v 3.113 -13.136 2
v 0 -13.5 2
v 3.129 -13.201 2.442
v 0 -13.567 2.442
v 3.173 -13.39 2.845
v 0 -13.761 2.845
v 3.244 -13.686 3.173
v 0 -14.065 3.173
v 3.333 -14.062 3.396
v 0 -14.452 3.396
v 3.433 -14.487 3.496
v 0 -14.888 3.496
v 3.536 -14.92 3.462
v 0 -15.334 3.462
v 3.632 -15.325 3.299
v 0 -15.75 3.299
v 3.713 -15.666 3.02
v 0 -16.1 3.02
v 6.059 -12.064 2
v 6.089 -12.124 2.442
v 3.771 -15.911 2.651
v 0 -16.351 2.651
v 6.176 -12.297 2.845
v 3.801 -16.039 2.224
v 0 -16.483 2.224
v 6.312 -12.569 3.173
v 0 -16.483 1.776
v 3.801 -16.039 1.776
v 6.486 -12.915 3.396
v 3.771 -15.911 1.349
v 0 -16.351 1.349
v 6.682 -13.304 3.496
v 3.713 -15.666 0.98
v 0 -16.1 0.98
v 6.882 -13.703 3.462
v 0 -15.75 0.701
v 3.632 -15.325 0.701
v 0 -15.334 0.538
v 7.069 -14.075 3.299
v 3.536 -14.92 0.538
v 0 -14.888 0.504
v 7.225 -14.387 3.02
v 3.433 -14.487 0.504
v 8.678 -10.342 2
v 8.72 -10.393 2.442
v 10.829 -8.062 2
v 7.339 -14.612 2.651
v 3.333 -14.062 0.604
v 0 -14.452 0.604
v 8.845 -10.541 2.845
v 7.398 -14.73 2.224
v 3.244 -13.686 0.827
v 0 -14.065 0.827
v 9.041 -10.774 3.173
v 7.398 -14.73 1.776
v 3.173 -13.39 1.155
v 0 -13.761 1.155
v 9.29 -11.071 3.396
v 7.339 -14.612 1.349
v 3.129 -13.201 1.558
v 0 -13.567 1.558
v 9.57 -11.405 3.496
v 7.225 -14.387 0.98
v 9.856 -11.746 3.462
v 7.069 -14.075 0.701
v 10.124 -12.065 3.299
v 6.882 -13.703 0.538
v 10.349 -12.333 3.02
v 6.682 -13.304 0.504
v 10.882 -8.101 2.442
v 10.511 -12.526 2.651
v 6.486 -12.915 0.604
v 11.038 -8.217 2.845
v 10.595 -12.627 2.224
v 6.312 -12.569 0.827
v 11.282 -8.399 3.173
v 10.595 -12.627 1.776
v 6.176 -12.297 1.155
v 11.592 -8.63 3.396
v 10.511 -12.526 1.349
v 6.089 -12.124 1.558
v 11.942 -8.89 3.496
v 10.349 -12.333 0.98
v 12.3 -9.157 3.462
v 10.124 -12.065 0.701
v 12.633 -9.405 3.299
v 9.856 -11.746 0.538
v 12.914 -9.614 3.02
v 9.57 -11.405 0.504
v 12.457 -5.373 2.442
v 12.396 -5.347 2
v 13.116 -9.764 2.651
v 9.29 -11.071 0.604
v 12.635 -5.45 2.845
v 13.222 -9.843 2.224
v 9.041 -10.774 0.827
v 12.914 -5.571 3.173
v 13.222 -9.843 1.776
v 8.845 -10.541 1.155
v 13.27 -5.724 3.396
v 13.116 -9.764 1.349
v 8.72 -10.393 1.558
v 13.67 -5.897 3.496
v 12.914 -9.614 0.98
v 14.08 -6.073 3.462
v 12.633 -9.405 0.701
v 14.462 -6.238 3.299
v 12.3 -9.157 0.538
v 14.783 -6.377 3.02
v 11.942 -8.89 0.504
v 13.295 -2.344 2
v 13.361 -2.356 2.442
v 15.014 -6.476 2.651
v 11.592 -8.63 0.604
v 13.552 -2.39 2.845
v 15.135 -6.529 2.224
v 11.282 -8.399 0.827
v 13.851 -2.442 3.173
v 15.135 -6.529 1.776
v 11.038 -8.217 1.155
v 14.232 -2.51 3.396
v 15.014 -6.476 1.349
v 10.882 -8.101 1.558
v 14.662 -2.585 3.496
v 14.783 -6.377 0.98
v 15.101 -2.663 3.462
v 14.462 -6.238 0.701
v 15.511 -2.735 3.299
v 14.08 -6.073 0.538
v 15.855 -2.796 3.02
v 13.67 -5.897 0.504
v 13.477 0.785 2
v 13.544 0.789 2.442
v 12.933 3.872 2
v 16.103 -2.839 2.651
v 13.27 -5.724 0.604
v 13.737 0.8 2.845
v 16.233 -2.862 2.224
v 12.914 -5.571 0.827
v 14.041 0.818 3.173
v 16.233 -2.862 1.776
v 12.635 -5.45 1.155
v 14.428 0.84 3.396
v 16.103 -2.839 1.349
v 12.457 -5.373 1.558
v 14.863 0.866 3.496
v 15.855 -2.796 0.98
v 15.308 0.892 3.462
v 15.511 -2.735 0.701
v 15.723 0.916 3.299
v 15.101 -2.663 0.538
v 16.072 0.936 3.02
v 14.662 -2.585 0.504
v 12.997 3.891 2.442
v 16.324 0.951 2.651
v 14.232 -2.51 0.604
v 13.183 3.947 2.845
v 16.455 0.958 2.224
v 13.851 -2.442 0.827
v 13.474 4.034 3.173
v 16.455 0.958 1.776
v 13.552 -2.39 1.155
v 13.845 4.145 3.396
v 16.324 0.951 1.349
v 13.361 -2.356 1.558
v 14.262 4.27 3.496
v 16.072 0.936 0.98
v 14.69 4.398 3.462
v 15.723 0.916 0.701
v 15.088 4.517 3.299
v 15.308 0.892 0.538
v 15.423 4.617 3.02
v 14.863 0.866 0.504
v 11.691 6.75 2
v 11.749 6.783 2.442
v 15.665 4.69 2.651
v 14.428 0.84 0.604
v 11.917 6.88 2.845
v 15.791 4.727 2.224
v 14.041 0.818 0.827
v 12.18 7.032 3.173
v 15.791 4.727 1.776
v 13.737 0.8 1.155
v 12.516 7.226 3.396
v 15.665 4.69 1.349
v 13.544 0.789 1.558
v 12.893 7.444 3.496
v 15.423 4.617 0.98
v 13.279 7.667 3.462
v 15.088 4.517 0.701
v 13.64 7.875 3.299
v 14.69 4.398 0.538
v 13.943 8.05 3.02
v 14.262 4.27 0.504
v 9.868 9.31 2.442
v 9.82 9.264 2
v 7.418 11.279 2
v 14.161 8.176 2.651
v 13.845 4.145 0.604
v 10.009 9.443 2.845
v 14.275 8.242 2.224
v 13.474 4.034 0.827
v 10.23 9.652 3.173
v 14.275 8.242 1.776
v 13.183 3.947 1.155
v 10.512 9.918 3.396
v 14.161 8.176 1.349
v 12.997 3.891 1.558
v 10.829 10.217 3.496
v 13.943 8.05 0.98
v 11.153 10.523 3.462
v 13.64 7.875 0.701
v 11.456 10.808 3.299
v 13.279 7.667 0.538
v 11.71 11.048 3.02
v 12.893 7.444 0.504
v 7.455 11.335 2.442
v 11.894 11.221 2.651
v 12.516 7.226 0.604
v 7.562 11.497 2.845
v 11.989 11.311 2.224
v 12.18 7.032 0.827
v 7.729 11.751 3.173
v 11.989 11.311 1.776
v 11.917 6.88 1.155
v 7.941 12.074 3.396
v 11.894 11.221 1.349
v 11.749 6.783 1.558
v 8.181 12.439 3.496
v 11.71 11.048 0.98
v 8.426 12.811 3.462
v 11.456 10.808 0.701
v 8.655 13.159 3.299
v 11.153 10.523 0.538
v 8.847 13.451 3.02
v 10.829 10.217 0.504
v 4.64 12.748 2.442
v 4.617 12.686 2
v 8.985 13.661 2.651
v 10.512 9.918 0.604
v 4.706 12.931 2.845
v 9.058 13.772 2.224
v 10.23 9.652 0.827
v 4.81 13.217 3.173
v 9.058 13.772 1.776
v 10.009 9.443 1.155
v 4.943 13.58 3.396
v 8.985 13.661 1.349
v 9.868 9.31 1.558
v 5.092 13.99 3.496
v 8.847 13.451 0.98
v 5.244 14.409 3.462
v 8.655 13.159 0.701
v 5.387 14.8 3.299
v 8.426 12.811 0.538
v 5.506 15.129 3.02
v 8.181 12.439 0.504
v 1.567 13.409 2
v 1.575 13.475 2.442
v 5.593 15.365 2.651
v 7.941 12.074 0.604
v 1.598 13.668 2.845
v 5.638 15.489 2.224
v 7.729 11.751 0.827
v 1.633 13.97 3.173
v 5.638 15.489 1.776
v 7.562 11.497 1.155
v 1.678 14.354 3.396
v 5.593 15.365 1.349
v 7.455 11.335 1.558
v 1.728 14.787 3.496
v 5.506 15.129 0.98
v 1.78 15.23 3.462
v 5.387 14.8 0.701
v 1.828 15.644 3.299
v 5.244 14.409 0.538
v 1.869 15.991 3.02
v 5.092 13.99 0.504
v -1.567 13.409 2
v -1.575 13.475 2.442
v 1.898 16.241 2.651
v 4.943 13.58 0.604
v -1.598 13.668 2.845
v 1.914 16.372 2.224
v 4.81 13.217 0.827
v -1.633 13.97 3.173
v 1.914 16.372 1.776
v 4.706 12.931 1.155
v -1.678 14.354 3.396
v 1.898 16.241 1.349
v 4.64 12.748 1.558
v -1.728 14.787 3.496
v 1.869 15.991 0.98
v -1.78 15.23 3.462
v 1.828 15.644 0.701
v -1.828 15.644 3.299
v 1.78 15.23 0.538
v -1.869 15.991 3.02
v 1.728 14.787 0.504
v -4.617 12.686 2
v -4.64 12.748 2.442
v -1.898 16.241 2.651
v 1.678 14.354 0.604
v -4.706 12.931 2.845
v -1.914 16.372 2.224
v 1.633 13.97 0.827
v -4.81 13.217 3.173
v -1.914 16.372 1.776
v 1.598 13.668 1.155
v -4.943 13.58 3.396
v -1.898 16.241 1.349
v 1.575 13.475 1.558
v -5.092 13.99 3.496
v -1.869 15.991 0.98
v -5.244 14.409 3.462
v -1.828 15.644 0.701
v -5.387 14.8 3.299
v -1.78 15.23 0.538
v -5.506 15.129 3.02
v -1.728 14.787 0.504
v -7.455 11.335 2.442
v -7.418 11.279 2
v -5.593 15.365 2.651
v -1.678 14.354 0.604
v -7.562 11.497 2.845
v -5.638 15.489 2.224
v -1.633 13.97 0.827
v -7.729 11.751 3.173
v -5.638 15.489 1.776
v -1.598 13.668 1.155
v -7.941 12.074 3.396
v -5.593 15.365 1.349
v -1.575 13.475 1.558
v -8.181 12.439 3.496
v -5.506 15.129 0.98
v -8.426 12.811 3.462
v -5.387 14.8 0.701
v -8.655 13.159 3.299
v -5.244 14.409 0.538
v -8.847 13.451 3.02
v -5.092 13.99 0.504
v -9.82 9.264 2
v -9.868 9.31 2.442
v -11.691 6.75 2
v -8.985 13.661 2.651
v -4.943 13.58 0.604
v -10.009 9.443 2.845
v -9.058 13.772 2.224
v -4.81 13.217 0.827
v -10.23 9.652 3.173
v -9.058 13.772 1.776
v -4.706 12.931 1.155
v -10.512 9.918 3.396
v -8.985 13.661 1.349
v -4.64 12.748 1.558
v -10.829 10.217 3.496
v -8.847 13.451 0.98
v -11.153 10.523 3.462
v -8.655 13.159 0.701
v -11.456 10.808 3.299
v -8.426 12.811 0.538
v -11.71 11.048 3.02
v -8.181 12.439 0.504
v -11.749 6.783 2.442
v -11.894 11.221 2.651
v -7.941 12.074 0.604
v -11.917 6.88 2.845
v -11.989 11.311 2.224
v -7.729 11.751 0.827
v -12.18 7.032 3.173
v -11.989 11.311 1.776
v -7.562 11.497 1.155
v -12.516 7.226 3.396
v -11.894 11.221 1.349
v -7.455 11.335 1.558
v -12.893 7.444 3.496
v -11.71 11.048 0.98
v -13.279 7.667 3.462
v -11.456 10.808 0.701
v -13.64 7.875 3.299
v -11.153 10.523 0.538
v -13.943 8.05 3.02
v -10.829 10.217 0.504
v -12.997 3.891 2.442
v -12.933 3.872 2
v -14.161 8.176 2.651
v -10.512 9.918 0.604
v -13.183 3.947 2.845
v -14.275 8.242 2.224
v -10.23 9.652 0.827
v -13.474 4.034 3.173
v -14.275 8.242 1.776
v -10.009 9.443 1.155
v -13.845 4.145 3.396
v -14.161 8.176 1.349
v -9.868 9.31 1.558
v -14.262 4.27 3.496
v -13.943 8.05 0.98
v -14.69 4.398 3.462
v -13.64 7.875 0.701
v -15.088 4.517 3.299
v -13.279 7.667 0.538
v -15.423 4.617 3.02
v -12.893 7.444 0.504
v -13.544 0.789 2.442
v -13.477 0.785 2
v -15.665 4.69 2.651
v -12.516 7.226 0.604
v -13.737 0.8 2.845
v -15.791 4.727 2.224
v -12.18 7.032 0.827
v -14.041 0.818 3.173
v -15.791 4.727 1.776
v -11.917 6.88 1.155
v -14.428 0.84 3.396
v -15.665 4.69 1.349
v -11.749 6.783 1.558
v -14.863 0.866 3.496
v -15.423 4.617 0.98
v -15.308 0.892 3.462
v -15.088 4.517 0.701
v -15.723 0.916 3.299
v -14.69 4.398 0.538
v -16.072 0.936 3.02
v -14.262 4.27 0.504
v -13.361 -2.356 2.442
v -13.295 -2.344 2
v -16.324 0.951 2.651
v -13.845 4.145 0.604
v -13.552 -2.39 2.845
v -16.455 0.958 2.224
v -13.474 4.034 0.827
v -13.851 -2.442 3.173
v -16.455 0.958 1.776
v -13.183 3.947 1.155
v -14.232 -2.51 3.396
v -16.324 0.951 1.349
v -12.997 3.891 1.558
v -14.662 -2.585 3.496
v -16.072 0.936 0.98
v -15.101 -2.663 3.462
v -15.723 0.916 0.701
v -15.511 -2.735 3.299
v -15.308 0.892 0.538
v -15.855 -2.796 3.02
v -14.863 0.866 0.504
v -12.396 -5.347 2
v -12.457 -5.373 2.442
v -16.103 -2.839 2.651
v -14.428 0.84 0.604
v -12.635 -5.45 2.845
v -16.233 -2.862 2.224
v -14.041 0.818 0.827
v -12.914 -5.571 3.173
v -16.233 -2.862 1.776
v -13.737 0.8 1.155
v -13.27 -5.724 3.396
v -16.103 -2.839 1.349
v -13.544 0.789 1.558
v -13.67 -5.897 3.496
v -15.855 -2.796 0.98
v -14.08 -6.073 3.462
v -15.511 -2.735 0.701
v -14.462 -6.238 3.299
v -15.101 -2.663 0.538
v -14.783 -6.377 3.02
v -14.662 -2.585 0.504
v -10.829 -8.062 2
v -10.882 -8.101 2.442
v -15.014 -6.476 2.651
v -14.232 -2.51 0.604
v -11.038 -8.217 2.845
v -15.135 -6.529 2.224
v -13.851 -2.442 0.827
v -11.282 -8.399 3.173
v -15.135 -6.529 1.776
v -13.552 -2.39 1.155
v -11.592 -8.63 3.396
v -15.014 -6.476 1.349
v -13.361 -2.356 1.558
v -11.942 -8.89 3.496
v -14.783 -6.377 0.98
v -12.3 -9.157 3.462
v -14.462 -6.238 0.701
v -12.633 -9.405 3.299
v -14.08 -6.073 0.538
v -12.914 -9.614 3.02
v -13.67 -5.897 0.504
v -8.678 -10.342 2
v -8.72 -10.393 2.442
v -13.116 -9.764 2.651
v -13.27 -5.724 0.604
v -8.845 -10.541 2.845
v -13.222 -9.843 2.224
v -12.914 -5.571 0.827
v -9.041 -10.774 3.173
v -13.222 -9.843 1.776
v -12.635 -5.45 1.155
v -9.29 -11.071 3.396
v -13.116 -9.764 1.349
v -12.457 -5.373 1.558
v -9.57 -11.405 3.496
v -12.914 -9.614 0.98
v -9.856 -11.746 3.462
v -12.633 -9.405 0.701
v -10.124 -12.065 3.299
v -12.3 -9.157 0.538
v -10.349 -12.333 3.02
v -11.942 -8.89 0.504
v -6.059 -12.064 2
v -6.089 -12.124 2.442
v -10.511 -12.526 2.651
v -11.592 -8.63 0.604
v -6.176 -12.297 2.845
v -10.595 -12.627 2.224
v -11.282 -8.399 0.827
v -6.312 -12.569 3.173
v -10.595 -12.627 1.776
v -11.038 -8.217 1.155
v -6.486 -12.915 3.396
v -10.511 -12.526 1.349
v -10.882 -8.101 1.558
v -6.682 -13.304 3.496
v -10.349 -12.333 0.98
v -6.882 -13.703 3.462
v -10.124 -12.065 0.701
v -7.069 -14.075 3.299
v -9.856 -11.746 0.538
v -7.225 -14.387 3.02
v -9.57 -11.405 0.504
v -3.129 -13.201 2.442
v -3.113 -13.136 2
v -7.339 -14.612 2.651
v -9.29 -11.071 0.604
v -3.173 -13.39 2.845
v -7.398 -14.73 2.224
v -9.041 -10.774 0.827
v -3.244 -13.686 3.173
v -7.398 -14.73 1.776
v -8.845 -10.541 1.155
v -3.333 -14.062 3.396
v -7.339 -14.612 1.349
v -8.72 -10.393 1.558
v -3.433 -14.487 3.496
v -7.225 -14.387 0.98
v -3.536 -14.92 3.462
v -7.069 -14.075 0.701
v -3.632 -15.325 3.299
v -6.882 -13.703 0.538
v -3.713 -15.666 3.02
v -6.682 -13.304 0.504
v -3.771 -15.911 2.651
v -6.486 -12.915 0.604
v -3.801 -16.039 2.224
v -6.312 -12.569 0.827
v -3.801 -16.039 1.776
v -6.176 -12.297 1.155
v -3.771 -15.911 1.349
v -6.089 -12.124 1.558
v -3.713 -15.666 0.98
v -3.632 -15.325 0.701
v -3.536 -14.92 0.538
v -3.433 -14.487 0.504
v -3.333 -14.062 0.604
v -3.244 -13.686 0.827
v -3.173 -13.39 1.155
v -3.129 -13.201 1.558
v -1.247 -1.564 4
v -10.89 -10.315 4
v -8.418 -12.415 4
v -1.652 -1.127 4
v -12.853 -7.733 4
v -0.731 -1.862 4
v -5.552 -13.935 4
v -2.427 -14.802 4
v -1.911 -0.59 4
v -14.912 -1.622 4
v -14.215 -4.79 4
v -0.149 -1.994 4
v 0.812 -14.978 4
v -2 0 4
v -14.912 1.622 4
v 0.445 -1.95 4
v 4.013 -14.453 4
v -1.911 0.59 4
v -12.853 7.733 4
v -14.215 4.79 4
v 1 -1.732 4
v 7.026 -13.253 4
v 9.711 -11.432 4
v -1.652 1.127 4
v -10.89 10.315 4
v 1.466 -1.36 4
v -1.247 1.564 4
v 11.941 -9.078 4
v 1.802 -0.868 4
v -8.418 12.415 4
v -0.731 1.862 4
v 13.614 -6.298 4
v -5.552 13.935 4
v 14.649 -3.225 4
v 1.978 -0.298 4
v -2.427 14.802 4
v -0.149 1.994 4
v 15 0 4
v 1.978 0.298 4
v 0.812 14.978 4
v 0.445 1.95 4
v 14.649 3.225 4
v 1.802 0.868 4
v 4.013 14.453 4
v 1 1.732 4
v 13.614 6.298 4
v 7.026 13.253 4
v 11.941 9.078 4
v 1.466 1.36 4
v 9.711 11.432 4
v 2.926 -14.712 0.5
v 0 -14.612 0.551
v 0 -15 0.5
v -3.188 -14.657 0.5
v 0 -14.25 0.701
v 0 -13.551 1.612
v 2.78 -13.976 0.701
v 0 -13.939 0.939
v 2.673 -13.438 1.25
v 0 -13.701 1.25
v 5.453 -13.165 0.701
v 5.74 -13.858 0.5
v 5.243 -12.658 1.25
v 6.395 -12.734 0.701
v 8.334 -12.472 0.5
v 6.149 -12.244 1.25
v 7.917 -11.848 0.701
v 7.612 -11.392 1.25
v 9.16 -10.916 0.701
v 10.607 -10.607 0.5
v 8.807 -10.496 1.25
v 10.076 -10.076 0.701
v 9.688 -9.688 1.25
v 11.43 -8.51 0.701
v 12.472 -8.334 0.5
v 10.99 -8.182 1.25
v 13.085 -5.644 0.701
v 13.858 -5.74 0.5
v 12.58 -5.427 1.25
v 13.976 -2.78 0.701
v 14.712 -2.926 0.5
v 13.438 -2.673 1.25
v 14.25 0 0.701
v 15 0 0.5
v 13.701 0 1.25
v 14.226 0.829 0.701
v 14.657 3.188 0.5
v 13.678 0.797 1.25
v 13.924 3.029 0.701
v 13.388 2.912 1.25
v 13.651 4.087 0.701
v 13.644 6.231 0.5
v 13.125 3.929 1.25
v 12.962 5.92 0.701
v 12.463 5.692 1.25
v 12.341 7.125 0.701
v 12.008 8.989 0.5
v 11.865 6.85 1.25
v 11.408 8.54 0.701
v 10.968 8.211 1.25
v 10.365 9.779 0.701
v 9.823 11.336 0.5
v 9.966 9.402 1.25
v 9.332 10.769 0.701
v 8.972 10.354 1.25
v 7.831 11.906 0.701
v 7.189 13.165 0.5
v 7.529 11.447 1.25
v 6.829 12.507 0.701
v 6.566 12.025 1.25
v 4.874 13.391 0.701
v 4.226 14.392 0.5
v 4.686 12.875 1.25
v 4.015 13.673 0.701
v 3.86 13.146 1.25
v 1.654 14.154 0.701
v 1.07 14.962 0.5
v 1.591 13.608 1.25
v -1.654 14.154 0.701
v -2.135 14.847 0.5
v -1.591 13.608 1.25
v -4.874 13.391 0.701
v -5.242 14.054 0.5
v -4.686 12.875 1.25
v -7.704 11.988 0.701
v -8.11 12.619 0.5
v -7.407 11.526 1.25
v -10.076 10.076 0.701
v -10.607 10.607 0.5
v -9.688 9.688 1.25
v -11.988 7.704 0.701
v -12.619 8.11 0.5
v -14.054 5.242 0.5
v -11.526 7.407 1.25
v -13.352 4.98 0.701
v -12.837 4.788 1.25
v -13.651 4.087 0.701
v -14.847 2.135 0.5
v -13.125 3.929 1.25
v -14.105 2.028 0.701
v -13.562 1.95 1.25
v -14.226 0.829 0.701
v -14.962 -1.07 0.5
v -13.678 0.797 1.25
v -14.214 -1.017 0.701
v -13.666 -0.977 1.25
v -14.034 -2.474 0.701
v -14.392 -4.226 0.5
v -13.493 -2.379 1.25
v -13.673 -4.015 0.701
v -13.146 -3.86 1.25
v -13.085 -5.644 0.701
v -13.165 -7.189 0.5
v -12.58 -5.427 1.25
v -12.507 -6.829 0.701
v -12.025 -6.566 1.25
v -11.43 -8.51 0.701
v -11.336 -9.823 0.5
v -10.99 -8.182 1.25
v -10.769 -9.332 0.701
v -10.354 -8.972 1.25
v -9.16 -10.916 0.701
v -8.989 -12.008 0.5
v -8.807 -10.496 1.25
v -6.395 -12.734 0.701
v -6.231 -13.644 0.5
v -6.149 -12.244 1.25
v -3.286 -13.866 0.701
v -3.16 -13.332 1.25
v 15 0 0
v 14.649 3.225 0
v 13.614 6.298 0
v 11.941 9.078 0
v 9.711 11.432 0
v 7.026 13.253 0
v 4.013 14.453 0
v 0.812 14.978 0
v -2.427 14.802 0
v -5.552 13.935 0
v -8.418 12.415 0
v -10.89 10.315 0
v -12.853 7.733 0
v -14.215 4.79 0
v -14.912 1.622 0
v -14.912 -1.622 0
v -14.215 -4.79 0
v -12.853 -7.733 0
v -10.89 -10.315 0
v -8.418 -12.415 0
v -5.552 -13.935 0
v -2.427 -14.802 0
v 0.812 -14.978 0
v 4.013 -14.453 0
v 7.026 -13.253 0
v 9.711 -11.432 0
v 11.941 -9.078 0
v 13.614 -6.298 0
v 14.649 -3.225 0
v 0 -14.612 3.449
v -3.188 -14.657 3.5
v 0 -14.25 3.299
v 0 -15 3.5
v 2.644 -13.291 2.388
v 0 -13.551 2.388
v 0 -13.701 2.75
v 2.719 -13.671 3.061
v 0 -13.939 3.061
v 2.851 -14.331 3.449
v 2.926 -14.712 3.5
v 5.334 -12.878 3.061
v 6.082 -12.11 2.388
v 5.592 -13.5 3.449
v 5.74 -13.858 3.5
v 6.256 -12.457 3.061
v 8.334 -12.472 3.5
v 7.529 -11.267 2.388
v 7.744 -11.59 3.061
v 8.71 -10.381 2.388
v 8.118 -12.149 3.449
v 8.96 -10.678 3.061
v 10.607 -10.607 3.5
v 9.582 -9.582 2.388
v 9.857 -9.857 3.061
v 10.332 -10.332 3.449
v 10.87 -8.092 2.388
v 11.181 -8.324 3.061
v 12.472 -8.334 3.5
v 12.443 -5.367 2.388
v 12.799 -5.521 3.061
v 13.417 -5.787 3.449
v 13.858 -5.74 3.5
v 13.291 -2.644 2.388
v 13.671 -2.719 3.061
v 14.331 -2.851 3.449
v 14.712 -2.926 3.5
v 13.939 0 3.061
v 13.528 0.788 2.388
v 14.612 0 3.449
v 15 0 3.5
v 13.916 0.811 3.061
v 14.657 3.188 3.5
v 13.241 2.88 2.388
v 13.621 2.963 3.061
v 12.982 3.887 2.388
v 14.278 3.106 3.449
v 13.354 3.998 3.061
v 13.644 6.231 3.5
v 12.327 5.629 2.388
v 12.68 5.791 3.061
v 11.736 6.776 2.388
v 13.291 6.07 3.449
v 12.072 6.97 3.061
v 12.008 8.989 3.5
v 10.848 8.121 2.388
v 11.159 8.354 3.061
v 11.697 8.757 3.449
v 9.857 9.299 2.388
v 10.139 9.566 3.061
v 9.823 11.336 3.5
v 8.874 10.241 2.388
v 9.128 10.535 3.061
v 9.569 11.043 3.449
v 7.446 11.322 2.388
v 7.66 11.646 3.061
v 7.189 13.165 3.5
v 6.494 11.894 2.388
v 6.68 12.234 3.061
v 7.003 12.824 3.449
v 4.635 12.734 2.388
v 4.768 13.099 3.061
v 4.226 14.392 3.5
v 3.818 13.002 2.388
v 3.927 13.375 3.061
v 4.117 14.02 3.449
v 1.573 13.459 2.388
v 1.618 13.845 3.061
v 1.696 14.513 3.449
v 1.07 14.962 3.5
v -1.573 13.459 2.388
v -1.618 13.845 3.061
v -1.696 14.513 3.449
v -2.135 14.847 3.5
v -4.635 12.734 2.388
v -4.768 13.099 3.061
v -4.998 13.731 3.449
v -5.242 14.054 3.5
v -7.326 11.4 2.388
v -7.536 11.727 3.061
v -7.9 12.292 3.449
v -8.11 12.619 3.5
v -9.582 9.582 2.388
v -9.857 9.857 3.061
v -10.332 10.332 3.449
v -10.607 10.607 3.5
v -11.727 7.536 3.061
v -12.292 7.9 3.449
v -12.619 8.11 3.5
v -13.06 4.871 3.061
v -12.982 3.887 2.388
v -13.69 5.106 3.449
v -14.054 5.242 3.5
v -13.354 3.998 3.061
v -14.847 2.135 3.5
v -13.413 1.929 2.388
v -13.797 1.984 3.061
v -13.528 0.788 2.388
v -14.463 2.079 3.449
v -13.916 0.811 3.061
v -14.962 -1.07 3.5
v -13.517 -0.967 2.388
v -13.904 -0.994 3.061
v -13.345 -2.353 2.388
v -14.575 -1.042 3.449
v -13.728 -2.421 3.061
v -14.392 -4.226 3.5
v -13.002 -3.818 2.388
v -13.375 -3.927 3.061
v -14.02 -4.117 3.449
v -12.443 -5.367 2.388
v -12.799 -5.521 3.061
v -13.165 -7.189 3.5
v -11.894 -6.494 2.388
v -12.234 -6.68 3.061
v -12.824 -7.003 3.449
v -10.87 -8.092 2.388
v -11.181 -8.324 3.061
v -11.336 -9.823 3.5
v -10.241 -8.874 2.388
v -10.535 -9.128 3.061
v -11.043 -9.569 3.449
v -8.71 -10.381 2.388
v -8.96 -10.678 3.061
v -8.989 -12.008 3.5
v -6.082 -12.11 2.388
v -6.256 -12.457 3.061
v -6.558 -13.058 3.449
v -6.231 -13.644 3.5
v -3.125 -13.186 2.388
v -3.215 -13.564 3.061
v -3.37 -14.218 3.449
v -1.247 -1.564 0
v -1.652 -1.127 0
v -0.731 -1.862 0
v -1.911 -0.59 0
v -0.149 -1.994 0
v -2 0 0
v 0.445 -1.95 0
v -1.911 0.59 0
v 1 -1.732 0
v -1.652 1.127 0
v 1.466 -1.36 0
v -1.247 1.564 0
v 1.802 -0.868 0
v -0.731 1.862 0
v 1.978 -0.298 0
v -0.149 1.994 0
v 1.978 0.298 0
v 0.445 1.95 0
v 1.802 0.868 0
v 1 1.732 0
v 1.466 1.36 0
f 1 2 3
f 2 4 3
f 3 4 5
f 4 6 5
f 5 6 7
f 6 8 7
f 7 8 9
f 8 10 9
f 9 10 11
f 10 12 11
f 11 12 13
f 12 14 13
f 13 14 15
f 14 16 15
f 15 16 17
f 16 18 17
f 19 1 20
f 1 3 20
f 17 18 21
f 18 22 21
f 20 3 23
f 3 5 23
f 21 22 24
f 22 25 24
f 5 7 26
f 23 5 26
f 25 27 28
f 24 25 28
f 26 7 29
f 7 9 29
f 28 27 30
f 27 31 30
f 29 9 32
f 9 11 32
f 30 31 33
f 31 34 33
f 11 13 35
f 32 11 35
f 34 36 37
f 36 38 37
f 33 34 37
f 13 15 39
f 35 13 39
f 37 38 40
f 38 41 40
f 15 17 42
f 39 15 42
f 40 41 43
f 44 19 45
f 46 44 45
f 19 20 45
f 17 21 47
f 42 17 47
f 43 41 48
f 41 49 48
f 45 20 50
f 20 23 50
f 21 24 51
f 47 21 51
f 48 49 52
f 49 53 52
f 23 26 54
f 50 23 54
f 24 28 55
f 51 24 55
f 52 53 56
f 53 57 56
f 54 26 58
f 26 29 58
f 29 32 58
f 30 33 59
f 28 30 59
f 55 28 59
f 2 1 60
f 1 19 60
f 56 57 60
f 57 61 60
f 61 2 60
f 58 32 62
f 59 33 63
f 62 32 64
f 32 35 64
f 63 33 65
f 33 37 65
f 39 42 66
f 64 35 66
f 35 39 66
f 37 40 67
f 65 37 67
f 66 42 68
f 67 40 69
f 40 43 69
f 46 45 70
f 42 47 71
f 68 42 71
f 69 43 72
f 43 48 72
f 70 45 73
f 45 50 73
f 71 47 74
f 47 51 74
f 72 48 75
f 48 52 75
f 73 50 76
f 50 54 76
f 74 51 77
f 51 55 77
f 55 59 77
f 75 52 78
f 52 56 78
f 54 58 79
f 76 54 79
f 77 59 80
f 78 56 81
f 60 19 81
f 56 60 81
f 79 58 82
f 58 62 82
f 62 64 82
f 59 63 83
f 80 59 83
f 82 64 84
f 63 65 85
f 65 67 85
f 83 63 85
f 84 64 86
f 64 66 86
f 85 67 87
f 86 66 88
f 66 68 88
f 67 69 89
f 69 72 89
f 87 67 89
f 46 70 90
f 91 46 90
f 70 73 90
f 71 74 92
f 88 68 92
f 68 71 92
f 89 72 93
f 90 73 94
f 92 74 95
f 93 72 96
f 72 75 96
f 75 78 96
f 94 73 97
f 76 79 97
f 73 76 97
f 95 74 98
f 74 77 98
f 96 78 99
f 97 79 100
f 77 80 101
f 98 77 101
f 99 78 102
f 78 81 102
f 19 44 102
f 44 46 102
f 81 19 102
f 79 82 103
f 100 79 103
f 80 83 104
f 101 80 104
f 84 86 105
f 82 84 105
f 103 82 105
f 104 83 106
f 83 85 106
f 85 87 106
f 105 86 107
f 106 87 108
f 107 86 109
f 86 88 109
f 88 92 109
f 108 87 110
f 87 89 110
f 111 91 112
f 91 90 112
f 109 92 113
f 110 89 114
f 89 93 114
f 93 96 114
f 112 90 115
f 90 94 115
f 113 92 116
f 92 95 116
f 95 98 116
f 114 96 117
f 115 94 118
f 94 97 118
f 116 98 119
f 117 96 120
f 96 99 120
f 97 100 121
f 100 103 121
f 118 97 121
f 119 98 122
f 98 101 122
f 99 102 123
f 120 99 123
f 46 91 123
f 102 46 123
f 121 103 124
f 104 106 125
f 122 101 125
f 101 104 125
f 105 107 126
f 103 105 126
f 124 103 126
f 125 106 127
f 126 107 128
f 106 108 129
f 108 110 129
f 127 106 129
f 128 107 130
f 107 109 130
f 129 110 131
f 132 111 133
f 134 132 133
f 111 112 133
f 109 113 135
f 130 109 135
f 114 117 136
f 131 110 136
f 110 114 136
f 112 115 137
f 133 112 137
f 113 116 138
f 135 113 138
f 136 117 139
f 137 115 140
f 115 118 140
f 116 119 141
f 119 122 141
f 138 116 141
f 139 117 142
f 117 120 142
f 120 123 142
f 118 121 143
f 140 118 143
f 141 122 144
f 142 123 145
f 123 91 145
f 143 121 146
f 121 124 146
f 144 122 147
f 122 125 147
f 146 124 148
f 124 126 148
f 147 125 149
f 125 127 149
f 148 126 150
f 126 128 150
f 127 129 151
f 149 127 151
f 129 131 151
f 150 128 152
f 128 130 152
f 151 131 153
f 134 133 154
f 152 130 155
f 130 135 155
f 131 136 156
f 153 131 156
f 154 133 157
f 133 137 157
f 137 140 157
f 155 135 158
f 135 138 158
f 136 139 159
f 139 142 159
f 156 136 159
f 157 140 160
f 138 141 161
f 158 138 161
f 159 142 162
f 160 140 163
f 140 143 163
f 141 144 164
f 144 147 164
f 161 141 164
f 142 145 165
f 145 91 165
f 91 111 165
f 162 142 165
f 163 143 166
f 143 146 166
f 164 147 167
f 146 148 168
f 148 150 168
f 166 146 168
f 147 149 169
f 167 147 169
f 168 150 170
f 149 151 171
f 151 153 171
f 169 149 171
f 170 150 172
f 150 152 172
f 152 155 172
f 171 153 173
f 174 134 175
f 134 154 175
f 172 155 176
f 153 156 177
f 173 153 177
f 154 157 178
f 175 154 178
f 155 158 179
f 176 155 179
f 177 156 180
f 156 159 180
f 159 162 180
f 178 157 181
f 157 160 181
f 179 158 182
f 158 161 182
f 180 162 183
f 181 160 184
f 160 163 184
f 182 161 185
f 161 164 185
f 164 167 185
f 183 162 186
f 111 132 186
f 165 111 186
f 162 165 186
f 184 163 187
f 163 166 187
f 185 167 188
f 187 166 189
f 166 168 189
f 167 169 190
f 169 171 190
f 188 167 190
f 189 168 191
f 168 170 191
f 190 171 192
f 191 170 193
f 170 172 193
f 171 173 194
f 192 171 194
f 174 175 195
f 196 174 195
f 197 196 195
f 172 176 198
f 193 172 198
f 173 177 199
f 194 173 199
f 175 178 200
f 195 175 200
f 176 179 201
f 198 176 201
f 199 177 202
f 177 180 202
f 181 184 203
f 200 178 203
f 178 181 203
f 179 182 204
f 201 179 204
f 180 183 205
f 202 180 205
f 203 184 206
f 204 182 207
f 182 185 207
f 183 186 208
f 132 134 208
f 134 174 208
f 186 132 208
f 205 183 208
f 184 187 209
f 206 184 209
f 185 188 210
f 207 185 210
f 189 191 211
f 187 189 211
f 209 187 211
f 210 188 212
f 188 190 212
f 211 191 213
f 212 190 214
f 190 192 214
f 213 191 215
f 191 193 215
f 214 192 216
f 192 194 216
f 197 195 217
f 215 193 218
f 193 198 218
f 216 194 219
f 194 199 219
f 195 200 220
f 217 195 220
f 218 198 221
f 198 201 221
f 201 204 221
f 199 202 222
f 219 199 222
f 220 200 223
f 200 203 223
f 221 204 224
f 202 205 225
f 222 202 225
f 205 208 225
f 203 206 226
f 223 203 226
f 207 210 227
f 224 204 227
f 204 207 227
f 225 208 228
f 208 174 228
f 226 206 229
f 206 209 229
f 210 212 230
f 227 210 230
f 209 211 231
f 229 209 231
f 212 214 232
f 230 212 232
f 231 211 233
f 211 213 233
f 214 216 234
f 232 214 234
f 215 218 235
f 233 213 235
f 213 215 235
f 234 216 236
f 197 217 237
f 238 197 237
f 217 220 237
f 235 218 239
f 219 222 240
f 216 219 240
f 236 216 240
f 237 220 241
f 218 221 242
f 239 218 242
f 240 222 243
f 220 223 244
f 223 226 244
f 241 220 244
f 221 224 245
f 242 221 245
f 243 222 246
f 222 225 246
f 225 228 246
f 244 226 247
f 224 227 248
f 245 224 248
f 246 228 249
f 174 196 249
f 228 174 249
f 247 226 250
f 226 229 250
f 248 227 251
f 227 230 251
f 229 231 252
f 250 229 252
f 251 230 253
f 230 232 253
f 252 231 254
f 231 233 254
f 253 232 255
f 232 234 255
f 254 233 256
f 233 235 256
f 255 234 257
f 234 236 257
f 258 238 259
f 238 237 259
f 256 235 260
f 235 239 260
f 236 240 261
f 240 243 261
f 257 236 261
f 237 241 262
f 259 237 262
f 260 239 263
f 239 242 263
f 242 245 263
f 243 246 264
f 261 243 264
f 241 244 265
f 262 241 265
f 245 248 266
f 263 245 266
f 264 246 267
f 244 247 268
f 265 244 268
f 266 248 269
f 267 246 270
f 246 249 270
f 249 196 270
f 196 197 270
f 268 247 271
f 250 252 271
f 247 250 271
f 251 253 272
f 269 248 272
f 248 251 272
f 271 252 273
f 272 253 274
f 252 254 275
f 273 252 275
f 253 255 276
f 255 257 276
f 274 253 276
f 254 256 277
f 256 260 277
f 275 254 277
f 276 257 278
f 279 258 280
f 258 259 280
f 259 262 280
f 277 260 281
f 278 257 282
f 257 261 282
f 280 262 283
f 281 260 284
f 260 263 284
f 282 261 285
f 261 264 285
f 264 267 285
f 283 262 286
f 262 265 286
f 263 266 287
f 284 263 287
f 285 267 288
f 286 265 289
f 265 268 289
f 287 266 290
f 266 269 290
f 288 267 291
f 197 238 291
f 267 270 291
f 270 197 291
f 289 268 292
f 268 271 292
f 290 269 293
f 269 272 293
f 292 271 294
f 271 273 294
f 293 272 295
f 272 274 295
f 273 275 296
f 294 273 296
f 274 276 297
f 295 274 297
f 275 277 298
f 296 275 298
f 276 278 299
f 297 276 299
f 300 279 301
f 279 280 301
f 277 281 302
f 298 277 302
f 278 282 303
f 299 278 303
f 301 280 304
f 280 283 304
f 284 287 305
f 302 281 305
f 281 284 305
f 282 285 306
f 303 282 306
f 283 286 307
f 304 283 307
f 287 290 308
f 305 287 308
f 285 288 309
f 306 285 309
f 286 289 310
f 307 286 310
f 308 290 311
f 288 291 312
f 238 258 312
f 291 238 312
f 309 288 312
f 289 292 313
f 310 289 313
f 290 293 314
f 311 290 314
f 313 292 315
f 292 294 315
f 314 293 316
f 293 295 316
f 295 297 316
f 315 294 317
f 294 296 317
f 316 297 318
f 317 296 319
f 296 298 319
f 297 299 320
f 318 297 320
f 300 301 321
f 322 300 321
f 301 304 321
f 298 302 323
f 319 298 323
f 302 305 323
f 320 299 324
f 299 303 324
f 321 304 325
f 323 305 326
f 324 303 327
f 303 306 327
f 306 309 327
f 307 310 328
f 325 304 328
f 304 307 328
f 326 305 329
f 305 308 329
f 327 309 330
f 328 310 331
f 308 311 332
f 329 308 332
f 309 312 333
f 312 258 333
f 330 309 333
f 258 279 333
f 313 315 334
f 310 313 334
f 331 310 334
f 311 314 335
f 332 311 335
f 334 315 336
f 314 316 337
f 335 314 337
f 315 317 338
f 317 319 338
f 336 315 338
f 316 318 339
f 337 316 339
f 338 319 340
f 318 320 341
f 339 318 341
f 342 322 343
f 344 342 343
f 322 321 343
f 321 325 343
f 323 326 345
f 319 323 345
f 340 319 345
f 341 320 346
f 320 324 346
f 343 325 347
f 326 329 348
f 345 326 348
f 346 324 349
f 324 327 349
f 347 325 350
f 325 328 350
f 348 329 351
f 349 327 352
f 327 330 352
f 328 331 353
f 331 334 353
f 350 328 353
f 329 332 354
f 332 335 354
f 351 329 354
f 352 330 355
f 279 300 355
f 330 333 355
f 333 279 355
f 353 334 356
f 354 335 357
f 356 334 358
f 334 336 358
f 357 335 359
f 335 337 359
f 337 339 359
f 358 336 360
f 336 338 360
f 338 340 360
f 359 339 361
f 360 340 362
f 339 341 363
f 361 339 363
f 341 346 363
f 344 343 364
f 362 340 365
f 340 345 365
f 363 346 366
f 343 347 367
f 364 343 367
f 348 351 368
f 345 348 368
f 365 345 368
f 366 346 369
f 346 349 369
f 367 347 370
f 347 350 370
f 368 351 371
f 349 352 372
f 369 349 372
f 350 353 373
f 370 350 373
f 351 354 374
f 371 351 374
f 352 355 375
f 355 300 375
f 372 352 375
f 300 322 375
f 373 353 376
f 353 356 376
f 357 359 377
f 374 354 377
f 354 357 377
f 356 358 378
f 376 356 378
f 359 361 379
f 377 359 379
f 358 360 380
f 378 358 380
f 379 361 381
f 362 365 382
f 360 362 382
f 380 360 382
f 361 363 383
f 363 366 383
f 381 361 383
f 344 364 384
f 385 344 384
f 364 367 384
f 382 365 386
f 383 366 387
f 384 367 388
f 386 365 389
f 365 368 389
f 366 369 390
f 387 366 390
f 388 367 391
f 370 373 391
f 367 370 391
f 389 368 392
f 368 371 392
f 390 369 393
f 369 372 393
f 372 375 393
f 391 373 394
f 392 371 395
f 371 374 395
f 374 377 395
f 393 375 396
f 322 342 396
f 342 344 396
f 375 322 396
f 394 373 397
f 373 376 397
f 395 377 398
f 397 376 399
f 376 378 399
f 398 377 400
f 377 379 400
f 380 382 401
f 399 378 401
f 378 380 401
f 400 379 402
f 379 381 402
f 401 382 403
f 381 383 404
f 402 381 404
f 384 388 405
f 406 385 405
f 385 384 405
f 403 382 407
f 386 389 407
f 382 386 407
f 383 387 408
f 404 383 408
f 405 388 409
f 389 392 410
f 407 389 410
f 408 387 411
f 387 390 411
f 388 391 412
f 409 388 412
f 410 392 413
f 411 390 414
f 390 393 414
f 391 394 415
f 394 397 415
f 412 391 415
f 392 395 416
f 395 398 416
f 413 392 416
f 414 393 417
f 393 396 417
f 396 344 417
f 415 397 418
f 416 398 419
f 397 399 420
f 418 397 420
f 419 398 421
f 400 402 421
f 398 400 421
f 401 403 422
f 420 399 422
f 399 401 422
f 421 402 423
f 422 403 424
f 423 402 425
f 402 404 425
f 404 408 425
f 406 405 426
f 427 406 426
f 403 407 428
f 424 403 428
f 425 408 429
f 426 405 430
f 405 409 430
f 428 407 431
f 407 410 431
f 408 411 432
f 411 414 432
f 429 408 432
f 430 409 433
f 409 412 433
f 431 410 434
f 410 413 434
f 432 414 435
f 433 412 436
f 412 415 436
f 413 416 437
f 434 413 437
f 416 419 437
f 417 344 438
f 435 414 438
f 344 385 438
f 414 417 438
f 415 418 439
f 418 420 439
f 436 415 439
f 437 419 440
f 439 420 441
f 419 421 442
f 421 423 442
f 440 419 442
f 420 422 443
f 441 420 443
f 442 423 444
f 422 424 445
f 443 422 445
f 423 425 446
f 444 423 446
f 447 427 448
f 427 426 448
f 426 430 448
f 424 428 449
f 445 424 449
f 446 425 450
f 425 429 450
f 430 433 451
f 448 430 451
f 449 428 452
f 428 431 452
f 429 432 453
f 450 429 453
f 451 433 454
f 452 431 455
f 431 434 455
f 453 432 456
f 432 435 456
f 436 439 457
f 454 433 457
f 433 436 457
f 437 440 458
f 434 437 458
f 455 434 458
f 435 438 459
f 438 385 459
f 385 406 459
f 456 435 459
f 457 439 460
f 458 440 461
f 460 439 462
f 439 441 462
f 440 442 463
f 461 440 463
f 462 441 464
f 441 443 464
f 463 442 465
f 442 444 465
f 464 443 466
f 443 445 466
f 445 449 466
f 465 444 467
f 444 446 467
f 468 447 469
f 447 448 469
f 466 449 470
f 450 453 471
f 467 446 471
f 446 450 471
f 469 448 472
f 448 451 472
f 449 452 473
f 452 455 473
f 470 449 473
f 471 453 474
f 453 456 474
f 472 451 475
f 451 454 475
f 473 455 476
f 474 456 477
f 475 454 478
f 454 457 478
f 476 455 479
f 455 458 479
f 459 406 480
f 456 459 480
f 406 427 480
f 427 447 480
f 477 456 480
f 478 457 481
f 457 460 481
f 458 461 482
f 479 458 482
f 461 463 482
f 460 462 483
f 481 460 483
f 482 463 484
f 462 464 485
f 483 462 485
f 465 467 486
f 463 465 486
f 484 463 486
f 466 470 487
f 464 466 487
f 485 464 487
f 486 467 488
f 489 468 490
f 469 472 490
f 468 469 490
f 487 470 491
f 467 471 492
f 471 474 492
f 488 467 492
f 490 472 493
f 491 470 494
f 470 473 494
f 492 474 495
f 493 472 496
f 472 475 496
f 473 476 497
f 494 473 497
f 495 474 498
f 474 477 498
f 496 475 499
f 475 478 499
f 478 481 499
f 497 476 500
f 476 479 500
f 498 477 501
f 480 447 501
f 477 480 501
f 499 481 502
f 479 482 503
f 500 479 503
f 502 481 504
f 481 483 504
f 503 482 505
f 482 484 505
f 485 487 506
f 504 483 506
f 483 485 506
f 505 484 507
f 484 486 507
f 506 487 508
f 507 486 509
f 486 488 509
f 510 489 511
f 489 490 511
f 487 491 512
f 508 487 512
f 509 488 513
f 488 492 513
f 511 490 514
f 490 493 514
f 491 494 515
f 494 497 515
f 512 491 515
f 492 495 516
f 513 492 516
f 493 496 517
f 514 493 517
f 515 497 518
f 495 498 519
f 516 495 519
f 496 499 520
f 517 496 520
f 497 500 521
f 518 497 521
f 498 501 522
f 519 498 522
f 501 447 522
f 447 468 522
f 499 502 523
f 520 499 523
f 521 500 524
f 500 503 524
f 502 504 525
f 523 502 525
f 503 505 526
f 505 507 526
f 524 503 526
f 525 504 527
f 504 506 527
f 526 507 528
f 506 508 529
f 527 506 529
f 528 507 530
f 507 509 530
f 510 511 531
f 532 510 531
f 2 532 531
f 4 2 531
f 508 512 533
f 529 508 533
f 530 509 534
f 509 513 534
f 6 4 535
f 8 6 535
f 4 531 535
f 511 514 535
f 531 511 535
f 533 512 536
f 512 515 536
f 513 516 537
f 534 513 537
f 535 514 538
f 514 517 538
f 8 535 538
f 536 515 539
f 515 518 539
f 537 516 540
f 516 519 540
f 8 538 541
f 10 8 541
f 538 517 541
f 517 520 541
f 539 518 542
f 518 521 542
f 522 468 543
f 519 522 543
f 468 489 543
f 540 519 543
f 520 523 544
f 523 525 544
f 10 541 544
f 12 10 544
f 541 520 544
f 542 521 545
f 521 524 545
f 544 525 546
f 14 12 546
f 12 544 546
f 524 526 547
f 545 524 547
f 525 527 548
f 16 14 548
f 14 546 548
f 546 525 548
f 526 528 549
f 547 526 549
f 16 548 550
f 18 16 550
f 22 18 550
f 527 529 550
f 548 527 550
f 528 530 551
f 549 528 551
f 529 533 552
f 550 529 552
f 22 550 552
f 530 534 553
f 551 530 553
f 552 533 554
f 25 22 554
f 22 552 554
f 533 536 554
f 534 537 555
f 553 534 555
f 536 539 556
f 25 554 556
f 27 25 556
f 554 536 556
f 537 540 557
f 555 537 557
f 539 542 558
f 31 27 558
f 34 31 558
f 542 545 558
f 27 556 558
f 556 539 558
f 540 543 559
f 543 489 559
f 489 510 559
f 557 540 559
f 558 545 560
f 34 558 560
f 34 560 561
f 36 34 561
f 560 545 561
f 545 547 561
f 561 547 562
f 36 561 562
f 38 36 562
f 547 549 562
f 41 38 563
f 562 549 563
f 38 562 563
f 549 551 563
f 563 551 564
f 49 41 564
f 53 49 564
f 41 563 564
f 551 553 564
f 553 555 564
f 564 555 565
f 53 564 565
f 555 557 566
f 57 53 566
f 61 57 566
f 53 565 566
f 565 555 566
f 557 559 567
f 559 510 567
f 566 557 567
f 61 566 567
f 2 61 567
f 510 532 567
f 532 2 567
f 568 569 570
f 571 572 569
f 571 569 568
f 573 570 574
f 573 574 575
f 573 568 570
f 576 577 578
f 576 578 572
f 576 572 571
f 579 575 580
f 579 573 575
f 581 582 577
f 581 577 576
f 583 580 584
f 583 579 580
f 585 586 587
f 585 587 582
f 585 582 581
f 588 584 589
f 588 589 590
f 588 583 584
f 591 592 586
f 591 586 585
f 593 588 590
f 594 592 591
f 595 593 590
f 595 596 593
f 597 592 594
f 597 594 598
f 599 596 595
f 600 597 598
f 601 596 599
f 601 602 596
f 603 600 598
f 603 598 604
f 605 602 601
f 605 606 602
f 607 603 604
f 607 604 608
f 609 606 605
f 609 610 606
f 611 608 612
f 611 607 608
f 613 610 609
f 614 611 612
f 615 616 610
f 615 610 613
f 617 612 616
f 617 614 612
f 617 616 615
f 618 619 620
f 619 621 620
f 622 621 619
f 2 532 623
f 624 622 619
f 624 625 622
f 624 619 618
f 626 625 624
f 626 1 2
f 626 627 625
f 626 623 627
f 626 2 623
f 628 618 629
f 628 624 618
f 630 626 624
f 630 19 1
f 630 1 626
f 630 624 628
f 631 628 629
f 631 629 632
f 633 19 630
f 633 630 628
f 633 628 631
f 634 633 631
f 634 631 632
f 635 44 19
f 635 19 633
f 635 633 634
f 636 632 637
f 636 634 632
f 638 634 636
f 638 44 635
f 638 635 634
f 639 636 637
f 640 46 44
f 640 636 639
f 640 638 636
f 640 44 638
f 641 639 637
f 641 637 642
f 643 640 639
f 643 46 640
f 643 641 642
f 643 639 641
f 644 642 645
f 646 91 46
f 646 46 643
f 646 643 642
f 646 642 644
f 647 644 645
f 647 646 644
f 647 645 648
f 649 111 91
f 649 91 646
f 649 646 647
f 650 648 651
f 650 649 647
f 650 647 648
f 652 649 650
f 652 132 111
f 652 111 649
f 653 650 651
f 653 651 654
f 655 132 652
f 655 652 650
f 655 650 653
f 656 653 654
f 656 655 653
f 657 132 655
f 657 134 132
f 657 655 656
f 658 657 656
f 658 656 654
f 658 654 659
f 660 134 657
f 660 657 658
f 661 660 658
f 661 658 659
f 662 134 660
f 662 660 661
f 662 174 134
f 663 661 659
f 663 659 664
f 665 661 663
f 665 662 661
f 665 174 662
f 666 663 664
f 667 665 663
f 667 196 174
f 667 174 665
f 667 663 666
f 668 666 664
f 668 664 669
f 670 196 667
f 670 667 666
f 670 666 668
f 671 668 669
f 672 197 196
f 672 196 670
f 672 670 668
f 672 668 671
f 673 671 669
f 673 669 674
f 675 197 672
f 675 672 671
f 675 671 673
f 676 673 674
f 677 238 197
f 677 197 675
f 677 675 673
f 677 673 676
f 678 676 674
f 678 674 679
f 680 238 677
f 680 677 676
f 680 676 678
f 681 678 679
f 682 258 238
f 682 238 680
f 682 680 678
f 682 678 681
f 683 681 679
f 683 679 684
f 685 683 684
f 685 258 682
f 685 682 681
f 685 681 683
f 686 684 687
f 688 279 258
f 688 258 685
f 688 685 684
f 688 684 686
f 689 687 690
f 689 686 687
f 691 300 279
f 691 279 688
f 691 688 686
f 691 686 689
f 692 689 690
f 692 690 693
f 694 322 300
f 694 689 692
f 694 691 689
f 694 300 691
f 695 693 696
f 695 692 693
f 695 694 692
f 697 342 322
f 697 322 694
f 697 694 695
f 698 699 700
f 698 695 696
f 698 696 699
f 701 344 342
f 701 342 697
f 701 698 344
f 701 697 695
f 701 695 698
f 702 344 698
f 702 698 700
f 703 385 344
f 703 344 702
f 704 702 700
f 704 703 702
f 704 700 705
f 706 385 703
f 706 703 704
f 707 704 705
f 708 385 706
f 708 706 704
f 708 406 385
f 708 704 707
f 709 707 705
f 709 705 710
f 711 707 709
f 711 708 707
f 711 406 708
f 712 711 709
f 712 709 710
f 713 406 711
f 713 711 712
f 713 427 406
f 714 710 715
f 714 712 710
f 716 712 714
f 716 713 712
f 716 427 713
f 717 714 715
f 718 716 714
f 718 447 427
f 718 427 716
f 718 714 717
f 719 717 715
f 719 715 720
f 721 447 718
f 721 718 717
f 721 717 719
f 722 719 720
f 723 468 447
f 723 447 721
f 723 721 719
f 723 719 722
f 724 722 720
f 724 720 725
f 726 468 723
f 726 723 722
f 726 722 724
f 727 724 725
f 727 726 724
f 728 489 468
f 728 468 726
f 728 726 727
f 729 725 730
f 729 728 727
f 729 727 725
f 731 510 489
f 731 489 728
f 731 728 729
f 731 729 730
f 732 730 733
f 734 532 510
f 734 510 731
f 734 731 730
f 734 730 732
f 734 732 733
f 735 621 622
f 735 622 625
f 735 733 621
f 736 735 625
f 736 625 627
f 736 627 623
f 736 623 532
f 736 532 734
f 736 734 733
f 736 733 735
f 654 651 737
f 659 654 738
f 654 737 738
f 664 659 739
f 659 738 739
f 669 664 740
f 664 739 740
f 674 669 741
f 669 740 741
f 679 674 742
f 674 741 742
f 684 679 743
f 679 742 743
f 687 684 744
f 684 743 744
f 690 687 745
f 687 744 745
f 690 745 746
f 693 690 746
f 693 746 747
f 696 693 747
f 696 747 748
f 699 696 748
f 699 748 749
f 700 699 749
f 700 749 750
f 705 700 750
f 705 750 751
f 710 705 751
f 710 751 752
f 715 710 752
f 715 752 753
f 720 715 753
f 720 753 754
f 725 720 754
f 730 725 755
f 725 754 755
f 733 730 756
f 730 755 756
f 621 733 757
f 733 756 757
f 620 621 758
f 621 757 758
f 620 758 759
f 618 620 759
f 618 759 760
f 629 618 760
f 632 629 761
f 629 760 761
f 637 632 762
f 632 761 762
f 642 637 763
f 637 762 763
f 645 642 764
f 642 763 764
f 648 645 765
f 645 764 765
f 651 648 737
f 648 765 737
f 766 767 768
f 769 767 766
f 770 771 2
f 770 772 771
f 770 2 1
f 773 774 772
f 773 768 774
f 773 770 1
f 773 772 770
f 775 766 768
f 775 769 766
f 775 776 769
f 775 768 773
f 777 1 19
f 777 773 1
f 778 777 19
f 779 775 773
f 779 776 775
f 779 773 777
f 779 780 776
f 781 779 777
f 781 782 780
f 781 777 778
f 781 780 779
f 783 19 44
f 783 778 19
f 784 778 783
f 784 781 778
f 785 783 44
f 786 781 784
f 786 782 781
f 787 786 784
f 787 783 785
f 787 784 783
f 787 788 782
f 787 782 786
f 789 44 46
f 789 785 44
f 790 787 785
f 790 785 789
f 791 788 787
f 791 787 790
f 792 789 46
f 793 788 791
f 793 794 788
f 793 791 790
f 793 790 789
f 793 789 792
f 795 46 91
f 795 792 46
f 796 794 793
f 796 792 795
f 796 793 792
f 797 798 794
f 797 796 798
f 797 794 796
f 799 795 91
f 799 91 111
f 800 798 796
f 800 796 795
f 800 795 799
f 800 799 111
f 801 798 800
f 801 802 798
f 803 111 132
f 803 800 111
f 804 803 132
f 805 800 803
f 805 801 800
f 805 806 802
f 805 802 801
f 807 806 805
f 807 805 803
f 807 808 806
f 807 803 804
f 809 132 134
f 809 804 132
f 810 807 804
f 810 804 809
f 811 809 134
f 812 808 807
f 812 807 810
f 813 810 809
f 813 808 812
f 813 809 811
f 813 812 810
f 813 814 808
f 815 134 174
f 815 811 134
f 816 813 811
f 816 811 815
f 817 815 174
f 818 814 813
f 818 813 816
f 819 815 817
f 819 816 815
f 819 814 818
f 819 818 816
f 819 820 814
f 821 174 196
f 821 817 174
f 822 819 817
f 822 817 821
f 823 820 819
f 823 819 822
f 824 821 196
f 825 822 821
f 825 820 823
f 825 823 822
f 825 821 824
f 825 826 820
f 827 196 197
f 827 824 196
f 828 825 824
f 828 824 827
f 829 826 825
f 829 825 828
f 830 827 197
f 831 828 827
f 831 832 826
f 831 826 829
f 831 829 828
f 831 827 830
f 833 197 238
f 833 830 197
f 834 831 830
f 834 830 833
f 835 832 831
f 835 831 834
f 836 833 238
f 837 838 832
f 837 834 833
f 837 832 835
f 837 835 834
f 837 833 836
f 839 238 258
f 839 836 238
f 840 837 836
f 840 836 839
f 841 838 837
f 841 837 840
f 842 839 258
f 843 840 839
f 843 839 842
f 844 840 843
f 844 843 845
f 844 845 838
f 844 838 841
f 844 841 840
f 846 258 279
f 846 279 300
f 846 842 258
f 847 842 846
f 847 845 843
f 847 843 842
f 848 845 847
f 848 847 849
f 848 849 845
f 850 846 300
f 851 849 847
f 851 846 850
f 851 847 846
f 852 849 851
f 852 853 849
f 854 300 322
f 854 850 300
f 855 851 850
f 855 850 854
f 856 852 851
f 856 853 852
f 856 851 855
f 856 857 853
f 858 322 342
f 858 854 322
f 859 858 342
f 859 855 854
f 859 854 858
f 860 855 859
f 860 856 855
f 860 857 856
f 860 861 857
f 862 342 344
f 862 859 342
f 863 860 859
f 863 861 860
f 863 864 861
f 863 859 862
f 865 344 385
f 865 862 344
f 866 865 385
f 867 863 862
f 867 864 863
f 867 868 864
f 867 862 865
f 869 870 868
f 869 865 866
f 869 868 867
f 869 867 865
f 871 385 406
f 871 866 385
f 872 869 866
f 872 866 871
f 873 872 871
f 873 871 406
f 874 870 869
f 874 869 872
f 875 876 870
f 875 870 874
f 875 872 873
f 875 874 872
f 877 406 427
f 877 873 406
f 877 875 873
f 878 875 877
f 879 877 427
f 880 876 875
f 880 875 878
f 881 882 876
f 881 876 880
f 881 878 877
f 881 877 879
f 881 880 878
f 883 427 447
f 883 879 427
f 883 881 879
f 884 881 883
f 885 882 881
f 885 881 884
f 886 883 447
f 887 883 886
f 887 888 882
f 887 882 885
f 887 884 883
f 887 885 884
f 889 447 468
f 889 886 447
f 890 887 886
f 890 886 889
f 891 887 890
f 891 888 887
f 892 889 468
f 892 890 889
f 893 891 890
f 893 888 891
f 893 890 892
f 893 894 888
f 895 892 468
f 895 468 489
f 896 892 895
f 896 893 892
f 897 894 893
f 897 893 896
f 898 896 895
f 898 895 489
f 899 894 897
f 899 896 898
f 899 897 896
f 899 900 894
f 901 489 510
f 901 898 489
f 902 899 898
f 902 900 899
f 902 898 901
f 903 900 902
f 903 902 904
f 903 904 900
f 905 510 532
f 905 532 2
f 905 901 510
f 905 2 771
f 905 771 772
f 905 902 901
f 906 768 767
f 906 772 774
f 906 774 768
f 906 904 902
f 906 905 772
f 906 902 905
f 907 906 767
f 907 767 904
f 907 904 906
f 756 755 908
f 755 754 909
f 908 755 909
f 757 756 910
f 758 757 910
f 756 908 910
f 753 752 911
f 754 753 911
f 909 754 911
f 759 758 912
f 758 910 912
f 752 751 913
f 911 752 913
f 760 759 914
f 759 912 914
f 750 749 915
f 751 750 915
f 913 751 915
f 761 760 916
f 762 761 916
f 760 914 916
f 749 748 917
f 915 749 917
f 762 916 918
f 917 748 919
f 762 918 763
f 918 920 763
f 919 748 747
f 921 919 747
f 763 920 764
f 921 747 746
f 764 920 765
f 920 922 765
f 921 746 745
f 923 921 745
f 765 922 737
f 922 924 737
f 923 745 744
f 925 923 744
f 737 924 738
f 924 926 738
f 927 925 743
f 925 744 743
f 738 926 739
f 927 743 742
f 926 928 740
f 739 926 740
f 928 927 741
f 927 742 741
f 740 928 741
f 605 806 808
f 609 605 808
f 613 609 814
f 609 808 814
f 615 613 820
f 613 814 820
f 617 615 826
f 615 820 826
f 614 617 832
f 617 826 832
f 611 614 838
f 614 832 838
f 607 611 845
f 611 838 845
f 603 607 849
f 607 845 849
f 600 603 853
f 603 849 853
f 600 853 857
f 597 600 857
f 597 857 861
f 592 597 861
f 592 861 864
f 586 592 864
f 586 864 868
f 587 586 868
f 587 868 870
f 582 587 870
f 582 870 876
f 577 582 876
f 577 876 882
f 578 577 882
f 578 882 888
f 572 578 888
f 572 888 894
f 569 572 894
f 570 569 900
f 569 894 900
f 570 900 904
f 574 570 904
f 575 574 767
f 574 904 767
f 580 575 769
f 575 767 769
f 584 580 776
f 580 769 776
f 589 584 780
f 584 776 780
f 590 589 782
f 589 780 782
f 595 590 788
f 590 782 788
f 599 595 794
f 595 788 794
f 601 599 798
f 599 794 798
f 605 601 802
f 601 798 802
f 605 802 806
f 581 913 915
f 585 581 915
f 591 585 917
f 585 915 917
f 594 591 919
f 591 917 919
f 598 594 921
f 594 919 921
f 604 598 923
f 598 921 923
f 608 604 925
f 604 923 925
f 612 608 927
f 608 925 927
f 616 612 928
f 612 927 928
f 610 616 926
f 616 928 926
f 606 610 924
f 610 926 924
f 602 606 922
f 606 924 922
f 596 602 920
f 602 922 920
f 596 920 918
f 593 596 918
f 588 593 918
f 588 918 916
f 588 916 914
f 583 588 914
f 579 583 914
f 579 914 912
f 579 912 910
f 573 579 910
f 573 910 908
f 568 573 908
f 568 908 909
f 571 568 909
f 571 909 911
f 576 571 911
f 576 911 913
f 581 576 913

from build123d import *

# Parameters (mm, degrees)
F0_R     = 15
F1_DEPTH = 4
F2_R     = 1.5
F5_D     = 4


with BuildPart() as f1:
    # F0 (on Top) → F1 (new body)
    with BuildSketch(Plane.XY):
        Circle(F0_R)
    extrude(amount=F1_DEPTH)

    # F2 (on Right) → F3 (revolve, cut)
    with BuildSketch(Plane.YZ):
        with Locations((-15, 2)):
            Circle(F2_R)
    revolve(axis=Axis((0, 0, 6.309232), (0, 0, 1)), mode=Mode.SUBTRACT)

    # F5 (through all)
    with Locations(Plane.XY.offset(4)):
        with Locations((0, 0)):
            Hole(F5_D / 2)


with BuildPart() as f6:
    # F2 (on Right) → F6 (revolve)
    with BuildSketch(Plane.YZ):
        with Locations((-15, 2)):
            Circle(F2_R)
    revolve(axis=Axis((0, 0, 6.309232), (0, 0, 1)))


solid = Compound([f1.part, f6.part])
